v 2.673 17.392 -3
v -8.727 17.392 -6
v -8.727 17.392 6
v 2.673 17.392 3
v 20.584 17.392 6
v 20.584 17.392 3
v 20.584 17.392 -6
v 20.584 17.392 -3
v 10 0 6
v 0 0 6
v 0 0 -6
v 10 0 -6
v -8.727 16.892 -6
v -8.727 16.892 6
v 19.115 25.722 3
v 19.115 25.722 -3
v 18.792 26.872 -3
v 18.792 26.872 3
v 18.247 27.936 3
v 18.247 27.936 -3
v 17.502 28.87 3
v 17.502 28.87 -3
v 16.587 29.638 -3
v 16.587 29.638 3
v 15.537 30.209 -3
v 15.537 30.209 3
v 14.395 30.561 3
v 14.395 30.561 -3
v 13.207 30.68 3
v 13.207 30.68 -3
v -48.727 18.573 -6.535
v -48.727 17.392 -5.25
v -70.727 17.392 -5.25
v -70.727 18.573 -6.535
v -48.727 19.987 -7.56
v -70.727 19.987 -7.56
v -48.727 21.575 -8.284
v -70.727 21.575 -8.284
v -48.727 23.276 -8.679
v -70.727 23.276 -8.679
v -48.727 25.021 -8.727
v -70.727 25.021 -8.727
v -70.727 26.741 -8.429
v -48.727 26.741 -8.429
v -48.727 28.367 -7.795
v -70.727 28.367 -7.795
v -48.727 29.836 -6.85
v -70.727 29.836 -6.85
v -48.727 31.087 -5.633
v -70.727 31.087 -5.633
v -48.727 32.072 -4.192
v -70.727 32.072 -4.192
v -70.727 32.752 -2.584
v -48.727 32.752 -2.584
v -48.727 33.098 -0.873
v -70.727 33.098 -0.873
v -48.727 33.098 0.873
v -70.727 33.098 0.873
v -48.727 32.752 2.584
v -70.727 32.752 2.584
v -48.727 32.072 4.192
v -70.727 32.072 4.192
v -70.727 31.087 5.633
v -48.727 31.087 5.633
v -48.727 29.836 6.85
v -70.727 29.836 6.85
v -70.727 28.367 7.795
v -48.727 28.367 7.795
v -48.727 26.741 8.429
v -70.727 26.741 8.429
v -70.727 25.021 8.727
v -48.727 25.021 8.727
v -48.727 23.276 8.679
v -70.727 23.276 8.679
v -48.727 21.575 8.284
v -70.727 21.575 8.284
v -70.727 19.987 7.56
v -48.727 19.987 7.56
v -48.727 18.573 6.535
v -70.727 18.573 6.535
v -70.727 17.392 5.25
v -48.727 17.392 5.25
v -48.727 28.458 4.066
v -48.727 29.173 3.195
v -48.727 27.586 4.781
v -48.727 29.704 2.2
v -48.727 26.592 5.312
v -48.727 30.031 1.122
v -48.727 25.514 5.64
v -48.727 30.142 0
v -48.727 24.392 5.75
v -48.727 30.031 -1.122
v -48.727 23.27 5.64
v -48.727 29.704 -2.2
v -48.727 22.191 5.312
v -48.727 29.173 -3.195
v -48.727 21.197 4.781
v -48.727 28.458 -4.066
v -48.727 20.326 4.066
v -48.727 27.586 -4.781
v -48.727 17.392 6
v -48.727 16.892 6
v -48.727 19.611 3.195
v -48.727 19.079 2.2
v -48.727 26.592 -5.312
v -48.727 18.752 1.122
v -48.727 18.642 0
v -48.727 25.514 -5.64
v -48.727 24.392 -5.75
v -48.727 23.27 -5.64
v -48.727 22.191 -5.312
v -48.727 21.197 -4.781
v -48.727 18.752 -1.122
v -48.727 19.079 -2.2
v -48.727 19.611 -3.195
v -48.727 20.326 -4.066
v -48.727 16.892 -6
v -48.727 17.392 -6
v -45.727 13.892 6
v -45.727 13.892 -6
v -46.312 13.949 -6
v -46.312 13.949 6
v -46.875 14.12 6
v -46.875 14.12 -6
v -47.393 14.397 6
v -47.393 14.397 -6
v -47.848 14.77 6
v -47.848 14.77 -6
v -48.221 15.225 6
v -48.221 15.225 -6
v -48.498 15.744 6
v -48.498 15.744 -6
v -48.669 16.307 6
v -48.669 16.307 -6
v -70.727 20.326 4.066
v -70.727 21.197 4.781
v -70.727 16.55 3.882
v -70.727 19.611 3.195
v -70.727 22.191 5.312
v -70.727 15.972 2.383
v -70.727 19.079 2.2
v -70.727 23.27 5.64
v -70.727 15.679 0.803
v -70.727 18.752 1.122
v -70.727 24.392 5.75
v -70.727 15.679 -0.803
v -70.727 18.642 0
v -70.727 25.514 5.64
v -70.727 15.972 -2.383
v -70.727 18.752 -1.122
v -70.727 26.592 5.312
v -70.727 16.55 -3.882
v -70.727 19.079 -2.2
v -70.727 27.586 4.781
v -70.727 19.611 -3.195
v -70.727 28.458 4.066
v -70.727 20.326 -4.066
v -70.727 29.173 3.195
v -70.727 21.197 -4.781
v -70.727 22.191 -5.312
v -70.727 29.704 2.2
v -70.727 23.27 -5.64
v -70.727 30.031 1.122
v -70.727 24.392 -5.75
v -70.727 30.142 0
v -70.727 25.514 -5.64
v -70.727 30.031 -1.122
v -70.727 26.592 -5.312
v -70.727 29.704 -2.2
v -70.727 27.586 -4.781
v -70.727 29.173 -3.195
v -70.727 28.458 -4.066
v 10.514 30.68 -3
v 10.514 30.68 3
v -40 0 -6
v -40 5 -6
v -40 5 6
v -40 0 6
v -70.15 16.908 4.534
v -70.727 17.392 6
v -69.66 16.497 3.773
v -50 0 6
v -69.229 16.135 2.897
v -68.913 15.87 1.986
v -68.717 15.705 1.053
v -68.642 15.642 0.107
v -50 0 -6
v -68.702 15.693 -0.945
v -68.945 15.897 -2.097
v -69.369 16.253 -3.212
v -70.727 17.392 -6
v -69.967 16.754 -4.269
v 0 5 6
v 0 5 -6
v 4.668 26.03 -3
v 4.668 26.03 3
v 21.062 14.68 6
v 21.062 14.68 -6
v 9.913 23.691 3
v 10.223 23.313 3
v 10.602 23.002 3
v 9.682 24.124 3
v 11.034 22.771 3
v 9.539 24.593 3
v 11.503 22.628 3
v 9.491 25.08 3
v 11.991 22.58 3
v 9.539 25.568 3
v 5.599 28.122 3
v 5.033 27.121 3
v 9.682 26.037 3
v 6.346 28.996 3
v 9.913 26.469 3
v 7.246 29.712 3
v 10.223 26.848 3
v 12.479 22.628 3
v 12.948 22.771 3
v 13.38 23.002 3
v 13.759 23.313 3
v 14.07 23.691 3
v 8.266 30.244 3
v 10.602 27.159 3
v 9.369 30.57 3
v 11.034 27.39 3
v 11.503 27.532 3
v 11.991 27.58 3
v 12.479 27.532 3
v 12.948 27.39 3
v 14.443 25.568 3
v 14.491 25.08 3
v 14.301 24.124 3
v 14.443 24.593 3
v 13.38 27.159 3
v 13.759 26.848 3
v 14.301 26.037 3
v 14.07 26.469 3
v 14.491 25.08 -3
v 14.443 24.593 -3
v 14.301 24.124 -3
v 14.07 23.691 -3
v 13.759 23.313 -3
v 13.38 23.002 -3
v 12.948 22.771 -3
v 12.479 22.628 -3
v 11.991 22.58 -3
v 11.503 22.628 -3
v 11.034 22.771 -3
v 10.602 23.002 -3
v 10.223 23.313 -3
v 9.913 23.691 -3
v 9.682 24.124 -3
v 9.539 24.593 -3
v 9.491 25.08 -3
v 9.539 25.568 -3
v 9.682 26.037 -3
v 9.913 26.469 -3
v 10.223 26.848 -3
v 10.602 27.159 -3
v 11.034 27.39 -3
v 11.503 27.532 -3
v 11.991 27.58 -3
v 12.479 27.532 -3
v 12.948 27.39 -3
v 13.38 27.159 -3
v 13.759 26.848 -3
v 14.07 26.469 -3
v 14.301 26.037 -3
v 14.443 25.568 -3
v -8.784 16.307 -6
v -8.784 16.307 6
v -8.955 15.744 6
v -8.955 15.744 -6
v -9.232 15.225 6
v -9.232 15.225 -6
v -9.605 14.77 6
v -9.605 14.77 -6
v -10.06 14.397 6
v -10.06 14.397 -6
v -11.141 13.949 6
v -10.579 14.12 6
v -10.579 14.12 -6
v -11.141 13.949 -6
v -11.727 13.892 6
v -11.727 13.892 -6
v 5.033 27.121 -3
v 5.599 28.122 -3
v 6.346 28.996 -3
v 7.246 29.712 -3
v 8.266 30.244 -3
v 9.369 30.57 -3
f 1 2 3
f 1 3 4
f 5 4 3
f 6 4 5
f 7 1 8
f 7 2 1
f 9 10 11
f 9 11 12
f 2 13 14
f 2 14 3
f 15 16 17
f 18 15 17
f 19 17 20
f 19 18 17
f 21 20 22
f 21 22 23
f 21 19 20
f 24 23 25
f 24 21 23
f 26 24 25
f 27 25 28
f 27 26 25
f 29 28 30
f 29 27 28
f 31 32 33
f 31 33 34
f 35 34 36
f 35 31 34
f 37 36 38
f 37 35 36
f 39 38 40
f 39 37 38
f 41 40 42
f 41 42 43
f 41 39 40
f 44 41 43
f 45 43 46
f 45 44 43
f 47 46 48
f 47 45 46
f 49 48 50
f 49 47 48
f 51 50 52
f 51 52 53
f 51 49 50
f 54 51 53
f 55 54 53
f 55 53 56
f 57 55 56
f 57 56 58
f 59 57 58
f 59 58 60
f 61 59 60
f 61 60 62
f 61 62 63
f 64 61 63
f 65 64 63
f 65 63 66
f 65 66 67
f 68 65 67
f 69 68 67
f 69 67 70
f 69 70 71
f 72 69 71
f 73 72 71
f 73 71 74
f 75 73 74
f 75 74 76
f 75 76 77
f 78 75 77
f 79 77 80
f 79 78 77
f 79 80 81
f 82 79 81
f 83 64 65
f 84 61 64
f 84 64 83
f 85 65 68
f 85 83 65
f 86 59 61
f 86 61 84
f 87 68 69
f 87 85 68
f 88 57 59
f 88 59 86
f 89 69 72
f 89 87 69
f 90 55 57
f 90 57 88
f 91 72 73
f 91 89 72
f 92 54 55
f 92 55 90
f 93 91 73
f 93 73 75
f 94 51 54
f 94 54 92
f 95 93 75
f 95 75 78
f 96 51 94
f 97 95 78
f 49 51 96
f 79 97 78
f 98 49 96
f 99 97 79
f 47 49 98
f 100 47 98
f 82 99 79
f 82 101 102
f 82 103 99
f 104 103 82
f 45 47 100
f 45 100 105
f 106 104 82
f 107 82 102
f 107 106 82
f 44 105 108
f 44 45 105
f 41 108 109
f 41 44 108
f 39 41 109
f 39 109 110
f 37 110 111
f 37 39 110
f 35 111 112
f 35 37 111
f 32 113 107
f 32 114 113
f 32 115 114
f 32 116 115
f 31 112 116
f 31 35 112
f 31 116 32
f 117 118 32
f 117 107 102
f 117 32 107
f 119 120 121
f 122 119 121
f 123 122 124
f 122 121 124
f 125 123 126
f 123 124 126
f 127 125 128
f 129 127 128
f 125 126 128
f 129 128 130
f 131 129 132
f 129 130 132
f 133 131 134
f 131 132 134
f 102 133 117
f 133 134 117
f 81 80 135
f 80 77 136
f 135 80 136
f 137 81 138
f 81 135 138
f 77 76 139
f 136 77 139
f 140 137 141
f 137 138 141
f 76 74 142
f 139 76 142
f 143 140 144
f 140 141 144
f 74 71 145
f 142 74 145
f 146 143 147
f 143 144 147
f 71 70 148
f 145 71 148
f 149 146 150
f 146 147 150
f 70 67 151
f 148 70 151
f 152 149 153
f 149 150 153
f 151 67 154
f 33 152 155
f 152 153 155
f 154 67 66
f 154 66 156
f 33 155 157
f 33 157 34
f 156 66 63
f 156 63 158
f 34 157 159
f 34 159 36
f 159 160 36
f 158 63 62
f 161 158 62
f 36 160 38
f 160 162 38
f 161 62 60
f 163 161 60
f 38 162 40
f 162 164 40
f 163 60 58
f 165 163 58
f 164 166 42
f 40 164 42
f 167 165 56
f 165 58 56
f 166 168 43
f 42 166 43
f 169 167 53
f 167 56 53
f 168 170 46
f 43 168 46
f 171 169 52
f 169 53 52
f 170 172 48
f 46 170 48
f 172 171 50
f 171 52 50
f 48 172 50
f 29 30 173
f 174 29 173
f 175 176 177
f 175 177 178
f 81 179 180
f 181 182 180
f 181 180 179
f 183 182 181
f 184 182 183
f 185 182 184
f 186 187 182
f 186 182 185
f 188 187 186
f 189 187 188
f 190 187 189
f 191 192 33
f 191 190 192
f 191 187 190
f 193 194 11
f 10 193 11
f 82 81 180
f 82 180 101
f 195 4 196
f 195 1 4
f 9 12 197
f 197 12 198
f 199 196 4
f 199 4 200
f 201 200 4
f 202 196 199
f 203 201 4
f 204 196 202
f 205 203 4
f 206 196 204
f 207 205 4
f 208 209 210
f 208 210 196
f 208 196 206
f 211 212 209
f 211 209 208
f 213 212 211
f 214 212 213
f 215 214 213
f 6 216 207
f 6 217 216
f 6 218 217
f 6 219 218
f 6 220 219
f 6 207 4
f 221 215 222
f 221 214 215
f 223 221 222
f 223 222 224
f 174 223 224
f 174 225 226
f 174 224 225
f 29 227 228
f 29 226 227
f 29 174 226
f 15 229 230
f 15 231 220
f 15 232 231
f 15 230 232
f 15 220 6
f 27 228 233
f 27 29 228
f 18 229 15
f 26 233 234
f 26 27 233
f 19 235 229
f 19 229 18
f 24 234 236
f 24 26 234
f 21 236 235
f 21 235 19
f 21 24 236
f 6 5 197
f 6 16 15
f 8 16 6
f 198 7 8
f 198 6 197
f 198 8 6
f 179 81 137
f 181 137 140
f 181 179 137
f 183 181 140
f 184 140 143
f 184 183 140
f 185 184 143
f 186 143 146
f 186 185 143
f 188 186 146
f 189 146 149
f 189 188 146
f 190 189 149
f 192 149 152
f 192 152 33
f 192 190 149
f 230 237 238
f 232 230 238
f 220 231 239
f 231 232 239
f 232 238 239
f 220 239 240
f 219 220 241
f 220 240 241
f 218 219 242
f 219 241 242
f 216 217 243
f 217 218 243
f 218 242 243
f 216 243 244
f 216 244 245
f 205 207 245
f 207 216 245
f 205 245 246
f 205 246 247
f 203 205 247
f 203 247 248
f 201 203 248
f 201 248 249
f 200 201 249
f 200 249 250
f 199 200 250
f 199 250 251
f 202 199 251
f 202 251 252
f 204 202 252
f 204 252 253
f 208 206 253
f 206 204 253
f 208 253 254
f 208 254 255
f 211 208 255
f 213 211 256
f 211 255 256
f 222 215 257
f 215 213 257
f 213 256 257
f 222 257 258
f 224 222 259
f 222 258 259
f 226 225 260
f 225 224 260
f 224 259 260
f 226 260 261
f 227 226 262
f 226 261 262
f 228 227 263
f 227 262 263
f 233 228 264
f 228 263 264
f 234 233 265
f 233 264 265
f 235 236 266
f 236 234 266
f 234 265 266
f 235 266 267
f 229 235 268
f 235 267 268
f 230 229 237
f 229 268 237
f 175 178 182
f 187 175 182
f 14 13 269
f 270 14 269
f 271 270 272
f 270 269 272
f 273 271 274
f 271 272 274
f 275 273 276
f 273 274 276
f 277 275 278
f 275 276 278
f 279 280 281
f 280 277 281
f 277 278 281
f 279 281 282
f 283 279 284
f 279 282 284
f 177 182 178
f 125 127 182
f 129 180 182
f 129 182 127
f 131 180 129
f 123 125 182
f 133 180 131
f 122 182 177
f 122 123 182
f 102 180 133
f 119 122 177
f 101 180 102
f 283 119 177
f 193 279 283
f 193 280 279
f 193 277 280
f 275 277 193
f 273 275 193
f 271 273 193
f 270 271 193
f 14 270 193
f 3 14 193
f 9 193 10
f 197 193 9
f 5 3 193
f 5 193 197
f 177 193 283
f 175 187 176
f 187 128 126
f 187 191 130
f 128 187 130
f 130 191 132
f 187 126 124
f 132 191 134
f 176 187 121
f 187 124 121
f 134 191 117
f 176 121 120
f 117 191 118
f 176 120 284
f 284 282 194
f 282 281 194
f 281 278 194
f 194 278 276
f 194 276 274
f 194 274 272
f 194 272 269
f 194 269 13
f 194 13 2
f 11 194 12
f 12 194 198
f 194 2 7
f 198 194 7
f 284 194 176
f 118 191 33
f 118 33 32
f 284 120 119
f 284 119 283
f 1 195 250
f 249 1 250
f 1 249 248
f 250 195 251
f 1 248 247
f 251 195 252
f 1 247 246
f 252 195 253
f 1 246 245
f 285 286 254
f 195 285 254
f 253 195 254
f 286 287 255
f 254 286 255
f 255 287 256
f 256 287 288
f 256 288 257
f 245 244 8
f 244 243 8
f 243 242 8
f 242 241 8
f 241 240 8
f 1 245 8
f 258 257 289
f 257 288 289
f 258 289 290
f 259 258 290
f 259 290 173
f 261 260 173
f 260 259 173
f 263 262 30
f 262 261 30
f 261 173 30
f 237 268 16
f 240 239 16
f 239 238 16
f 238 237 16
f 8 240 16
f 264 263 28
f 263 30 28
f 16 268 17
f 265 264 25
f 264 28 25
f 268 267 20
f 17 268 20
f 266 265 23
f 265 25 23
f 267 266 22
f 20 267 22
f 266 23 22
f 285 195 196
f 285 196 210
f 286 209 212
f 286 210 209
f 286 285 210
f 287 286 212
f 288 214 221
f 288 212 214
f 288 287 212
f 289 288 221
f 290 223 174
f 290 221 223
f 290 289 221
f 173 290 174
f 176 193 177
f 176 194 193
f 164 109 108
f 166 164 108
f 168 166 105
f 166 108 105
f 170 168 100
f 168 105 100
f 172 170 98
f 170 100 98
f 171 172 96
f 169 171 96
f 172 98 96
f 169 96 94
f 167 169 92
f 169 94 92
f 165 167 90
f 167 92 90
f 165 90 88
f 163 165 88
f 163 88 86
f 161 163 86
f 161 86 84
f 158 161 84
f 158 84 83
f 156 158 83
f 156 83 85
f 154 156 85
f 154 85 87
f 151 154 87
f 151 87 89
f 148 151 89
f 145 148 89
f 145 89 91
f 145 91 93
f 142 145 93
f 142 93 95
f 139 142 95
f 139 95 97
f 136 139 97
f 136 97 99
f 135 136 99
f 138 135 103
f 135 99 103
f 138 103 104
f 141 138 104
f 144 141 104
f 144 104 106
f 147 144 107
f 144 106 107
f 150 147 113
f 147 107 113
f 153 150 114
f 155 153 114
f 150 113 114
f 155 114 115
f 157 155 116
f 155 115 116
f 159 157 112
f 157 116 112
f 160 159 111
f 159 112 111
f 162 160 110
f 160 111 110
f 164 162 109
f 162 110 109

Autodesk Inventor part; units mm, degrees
ref_plane "YZ Plane" through (0, 0, 0) normal (1, 0, 0) x (0, 1, 0)
ref_plane "XZ Plane" through (0, 0, 0) normal (0, 1, 0) x (-1, 0, 0)
ref_plane "XY Plane" through (0, 0, 0) normal (0, 0, 1) x (1, 0, 0)
sketch "Szkic1" plane through (0, 0, 0) normal (0, 0, 1) x (1, 0, 0)
  line L0 (0, 5) -> (0, 0)
  line L1 (0, 0) -> (10, 0)
  line L2 (0, 5) -> (-40, 5)
  line L3 (-40, 5) -> (-40, 0)
  line L4 (-40, 0) -> (-50, 0)
  line L5 (-50, 0) -> (-70.7267, 17.3918)
  line L6 (-70.7267, 17.3918) -> (-48.7267, 17.3918)
  line L7 (-48.7267, 17.3918) -> (-48.7267, 13.8918)
  line L8 (-48.7267, 13.8918) -> (-8.7267, 13.8918)
  line L9 (-8.7267, 13.8918) -> (-8.7267, 17.3918)
  line L10 (-8.7267, 17.3918) -> (2.6733, 17.3918)
  line L11 (2.6733, 17.3918) -> (5.7412, 30.6804)
  line L12 (18.2412, 30.6804) -> (5.7412, 30.6804)
  line L13 (10, 0) -> (21.0625, 14.6804)
  line L14 (18.2412, 30.6804) -> (21.0625, 14.6804)
  circle A0 centre (11.9912, 25.0804) radius 2.5
  line L15 (2.6733, 17.3918) -> (20.5844, 17.3918)
  point P0 (11.9912, 30.6804)
  dimension "d0" = 10
  dimension "d1" = 40
  dimension "d2" = 10
  dimension "d3" = 22
  dimension "d4" = 3.5
  dimension "d5" = 40
  dimension "d6" = 11.4
  dimension "d7" = 103
  dimension "d8" = 12.5
  dimension "d9" = 127
  dimension "d10" = 16
  dimension "d11" = 5
  dimension "d12" = 133
  dimension "d13" = 5
  dimension "d14" = 5.6
extrude "Wyciągnięcie proste1" add sketch "Szkic1" along normal mid plane 12 contours L2 L3 L4 L5 L6 L7 L8 L9 L10 L15 L14 L13 L1 L0
extrude "Wyciągnięcie proste2" add sketch "Szkic1" along normal mid plane 6 contours L15 L11 L12 L14
fillet "Zaokrąglenie1" radius 3 1 edges at (-48.7267, 13.8918, 0)
fillet "Zaokrąglenie2" radius 3 1 edges at (-8.7267, 13.8918, 0)
fillet "Zaokrąglenie3" radius 6 1 edges at (18.2412, 30.6804, 0)
fillet "Zaokrąglenie4" radius 6 1 edges at (5.7412, 30.6804, 0)
sketch "Szkic3" plane through (-48.7267, 17.3918, 6) normal (1, 0, 0) x (0, 0, -1)
  line L0 (12, 0) -> (0, 0) projected
  circle A0 centre (6, 7) radius 8.75
  circle A1 centre (6, 7) radius 5.75
  point P0 (6, -17.3918)
  dimension "d39" = 17.5
  dimension "d40" = 11.5
extrude "Wyciągnięcie proste3" add sketch "Szkic3" against normal blind 22 contours A0 L0 | L0 A0 | A1
extrude "Wyciągnięcie proste4" cut sketch "Szkic3" against normal blind 22 contours A1
properties material "Stal"
